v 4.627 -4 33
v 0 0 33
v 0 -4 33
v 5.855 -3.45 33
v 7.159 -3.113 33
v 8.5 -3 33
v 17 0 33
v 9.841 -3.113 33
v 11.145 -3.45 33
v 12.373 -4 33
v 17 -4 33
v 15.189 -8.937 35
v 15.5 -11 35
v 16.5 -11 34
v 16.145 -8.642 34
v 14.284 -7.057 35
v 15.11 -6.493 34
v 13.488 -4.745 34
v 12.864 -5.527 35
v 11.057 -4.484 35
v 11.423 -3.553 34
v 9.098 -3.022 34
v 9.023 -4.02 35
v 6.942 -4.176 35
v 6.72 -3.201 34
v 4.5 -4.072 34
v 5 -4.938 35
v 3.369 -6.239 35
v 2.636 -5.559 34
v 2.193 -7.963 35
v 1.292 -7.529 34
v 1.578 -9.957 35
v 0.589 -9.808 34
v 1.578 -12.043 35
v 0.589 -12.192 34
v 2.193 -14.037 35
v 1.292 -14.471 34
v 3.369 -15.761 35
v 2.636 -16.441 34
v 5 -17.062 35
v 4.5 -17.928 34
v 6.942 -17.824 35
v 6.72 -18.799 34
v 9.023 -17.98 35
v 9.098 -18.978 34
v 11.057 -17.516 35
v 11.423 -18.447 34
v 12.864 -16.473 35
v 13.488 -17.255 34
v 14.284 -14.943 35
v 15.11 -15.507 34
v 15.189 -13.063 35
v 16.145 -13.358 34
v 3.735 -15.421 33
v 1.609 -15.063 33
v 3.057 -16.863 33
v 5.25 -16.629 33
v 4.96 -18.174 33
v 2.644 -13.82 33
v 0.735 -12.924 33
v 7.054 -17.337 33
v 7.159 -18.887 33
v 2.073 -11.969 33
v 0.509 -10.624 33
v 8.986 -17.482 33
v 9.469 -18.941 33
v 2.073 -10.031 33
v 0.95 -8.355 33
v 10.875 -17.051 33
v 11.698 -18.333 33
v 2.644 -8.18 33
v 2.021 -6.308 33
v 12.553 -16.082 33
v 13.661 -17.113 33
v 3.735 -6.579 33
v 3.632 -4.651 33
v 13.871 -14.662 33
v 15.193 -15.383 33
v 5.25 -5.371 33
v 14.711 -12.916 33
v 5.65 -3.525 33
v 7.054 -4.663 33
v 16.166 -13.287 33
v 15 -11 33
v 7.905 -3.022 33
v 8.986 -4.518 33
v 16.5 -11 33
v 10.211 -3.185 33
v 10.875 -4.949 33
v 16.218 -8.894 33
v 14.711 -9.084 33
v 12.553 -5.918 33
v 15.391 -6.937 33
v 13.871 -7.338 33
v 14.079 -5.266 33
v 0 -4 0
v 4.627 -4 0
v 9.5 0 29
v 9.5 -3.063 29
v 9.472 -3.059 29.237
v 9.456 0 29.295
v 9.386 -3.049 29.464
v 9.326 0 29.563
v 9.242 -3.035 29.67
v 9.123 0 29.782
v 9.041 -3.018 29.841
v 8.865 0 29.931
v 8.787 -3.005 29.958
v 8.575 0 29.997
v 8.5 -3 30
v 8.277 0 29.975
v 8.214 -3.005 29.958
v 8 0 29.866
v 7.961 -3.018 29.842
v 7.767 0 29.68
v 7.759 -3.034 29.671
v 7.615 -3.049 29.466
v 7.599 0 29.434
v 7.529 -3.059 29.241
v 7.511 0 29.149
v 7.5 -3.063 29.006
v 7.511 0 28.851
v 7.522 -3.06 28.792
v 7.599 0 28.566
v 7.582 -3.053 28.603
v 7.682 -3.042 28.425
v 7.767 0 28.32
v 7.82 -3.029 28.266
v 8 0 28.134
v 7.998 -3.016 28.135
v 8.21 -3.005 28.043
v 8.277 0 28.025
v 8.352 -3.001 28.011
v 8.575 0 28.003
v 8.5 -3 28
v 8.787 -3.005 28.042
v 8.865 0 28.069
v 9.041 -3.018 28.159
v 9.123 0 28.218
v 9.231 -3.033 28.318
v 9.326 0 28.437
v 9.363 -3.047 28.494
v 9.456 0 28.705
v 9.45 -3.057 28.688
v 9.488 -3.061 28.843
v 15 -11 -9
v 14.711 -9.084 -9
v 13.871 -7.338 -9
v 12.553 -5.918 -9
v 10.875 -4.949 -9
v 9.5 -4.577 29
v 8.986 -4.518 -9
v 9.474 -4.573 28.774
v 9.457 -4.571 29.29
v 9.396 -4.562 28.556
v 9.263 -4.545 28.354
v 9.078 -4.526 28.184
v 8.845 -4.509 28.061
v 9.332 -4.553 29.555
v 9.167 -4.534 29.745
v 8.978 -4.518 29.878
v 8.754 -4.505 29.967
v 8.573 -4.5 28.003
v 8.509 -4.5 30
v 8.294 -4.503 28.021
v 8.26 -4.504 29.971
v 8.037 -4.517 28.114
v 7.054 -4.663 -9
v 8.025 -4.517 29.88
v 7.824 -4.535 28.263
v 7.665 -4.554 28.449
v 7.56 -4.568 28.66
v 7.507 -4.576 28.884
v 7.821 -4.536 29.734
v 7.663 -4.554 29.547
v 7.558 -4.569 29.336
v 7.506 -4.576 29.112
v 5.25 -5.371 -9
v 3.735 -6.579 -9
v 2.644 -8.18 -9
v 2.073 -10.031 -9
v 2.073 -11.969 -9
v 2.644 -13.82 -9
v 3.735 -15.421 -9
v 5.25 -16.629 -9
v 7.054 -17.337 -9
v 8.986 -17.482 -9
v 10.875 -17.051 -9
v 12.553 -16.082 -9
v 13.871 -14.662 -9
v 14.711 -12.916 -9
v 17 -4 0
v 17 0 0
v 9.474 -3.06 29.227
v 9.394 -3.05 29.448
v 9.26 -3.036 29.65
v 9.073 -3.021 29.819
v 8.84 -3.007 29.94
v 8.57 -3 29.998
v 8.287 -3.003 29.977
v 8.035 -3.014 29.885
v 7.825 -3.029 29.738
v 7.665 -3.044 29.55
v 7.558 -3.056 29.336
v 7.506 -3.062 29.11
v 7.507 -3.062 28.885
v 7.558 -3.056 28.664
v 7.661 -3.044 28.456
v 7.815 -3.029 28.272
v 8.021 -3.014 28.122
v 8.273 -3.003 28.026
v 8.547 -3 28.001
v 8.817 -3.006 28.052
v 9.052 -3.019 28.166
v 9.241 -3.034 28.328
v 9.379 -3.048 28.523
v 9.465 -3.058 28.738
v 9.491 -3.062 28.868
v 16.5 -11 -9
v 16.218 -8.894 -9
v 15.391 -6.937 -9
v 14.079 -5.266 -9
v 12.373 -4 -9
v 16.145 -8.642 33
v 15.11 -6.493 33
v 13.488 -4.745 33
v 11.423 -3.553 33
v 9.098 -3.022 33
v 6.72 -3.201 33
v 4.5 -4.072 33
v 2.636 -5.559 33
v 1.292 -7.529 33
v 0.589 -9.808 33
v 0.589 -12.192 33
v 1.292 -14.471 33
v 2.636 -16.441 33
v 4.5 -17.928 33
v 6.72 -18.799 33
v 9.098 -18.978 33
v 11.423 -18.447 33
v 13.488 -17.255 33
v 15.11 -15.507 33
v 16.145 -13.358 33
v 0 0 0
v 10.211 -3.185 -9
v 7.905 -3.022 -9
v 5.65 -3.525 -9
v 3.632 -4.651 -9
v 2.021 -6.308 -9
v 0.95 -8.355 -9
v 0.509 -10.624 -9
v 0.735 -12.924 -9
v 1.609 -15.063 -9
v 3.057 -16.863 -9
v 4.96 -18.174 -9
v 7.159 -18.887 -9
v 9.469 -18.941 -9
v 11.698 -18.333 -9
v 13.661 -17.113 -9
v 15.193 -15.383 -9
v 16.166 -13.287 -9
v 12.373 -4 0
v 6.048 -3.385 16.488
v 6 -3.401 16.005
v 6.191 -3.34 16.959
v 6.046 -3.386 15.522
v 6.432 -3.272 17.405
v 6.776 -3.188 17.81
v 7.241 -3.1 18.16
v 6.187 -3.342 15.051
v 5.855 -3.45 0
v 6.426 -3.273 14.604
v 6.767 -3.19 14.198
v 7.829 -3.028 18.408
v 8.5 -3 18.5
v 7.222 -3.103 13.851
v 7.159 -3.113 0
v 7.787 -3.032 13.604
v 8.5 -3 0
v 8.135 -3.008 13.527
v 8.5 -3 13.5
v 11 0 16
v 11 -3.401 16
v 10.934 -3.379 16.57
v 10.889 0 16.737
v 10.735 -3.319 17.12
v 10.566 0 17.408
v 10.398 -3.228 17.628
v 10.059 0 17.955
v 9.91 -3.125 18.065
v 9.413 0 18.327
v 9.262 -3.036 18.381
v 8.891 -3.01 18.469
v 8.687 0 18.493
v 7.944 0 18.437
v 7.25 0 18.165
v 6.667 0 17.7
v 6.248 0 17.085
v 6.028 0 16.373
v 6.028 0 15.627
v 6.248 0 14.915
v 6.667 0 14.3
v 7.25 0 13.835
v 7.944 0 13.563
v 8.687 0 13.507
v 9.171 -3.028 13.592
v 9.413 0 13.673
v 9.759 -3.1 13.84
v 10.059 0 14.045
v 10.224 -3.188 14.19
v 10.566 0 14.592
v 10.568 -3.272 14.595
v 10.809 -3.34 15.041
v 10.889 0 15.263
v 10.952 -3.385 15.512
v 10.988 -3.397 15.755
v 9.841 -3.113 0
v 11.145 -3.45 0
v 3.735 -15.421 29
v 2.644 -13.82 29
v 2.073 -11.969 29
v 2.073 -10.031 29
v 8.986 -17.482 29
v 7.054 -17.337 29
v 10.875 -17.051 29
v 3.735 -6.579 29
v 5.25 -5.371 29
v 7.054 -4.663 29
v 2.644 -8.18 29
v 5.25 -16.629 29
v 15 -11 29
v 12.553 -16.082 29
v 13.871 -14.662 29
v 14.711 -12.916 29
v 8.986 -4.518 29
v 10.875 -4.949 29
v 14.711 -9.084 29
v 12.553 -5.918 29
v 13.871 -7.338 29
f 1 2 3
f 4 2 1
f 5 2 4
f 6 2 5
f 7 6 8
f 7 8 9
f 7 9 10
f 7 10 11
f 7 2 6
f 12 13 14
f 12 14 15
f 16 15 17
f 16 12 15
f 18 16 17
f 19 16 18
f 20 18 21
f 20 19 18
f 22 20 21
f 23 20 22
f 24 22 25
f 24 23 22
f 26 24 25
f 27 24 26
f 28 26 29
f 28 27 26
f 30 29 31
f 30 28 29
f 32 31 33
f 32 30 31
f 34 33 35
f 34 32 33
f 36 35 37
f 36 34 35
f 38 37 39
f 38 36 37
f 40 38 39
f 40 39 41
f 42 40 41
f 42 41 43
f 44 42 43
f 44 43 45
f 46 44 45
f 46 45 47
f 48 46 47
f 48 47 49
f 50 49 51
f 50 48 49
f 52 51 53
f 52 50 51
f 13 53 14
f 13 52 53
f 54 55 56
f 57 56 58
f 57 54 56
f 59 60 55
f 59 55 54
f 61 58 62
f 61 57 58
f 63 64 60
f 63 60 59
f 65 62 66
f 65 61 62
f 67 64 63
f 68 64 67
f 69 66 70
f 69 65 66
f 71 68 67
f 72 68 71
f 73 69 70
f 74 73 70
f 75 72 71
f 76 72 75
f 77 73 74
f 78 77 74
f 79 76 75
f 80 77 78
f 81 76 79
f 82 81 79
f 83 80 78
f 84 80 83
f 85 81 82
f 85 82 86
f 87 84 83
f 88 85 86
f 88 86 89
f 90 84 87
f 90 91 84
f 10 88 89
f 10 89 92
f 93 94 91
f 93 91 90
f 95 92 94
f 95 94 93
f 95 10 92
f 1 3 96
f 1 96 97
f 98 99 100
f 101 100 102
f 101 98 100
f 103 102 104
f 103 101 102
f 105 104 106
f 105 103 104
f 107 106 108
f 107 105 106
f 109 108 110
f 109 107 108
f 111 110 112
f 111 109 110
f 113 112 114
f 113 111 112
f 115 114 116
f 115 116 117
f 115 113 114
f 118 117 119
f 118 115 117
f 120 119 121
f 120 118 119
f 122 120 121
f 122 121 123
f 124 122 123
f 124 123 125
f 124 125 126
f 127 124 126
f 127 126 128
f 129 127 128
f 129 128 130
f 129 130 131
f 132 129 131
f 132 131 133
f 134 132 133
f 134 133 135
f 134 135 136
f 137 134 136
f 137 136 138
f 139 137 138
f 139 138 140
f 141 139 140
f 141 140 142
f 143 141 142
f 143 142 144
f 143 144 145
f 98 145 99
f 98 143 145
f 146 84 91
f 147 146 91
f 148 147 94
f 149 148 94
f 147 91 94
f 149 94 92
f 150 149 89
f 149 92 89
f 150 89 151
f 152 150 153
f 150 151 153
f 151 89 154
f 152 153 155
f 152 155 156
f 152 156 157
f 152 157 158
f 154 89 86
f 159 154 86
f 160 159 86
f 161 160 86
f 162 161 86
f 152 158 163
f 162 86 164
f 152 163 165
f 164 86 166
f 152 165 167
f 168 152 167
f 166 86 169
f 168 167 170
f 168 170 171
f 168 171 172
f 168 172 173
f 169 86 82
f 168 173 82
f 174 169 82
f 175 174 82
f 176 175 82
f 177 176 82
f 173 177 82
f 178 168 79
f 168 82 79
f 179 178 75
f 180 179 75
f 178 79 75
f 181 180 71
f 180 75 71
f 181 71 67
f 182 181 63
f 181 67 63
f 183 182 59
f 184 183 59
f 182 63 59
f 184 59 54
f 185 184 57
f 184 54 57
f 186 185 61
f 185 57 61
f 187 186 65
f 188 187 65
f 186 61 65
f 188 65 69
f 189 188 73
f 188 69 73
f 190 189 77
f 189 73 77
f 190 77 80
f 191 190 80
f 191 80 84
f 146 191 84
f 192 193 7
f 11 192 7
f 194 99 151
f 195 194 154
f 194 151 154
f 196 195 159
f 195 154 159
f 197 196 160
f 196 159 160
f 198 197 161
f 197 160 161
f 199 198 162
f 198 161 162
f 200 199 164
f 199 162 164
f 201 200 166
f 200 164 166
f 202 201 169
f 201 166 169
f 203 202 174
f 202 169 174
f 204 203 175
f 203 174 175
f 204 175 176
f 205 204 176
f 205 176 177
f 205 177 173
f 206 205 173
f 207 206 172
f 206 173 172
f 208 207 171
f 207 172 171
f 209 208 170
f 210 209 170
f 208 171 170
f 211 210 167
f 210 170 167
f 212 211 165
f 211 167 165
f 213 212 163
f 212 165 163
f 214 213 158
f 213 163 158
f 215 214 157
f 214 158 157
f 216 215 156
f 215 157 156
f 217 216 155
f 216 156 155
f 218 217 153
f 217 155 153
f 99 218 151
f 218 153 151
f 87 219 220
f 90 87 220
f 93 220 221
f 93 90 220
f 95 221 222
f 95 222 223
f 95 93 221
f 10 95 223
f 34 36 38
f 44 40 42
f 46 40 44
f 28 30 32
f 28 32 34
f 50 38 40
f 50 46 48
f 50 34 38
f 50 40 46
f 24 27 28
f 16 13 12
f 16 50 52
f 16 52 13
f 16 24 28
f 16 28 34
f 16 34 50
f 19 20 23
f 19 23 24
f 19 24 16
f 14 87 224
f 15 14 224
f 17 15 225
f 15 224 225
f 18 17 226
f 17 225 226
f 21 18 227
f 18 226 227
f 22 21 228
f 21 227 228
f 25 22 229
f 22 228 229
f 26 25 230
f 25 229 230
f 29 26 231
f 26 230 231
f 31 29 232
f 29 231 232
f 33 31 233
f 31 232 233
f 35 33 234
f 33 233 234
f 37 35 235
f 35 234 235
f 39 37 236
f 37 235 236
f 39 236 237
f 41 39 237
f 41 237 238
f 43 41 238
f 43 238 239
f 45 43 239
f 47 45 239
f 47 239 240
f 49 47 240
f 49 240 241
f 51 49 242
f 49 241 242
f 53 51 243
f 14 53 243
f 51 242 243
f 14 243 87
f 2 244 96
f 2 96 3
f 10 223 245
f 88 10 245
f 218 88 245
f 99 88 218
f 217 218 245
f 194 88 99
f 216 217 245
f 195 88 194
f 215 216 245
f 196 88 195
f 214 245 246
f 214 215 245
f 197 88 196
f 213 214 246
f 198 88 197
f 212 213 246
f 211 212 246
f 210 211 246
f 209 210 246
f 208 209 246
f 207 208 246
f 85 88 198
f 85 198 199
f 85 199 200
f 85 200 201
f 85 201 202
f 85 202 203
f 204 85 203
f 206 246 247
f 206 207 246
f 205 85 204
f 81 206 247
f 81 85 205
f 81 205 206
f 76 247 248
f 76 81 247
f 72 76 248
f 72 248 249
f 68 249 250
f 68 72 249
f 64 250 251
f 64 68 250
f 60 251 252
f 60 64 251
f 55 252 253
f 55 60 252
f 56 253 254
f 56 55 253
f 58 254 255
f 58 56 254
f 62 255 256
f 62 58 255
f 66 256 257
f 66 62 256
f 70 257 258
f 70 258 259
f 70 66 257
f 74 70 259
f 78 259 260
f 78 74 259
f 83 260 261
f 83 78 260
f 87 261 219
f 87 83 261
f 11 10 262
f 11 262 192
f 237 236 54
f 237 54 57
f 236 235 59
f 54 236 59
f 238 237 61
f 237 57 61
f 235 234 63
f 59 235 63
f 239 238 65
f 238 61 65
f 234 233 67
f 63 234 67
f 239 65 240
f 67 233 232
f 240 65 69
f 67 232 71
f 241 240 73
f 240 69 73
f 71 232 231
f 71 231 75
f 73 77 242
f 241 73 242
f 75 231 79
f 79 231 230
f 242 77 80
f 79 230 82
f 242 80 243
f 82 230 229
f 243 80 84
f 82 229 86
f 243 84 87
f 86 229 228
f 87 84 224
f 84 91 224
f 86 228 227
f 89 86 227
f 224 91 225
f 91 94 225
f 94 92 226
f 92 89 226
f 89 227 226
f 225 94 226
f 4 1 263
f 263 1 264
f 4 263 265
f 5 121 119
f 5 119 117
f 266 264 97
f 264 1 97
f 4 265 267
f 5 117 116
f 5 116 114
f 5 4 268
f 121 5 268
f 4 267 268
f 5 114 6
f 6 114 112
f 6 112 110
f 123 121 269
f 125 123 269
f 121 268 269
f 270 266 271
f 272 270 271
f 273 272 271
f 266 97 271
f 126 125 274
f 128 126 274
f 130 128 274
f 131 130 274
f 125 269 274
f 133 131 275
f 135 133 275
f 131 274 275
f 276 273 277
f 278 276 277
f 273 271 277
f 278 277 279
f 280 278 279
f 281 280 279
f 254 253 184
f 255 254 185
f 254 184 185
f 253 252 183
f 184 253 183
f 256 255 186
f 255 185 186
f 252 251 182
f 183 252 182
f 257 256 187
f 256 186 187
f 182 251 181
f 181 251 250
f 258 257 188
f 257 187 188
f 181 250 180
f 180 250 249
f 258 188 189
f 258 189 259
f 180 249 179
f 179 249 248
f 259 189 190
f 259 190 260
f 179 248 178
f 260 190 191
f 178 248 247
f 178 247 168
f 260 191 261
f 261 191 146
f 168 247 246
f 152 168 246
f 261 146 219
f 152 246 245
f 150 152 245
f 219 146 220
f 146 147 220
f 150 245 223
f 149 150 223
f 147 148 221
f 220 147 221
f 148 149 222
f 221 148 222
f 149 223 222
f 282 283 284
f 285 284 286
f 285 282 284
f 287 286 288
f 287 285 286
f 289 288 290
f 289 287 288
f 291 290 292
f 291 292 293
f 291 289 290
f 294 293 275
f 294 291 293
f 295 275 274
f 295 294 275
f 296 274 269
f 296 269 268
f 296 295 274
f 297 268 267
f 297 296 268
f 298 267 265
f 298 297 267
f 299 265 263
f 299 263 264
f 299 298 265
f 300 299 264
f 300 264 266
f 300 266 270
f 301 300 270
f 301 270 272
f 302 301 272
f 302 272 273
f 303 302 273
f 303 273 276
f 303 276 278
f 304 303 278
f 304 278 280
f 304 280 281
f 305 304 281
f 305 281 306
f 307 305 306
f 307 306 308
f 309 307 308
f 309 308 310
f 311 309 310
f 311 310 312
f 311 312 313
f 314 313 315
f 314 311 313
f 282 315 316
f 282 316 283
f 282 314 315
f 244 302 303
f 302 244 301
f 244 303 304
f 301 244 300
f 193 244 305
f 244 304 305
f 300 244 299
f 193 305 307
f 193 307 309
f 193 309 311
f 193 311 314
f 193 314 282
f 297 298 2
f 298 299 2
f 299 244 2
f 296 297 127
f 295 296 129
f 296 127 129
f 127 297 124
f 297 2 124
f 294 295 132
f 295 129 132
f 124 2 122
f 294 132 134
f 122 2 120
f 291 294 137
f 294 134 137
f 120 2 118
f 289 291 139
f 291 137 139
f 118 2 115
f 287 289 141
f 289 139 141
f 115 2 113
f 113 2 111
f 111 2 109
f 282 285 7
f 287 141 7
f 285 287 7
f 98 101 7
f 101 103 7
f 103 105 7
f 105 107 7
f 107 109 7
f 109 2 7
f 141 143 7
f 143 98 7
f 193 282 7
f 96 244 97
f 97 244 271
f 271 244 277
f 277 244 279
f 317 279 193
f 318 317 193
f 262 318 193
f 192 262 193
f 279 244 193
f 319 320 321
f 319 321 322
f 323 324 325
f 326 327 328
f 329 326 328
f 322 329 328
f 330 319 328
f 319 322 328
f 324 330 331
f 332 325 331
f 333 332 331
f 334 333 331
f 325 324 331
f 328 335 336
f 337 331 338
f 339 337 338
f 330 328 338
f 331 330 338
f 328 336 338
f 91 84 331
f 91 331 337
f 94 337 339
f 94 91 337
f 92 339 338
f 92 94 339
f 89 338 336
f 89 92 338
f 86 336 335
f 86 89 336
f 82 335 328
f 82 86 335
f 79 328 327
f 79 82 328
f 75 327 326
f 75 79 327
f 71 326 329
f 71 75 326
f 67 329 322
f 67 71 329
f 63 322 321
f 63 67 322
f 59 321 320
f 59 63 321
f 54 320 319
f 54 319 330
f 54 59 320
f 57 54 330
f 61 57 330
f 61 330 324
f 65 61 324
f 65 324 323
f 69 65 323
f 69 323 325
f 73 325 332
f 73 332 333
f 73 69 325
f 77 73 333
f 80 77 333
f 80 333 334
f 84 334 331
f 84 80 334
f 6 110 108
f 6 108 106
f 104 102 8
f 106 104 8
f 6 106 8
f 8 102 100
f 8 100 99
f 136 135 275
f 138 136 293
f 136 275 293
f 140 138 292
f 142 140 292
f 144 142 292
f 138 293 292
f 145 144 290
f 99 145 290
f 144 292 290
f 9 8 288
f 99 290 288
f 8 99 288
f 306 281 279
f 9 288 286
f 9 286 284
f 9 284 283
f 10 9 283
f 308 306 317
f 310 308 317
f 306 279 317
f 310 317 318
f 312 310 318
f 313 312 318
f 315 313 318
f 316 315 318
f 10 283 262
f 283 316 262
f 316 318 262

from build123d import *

# Parameters (mm, degrees)
F0_W      = 17
F0_H      = 33
F0_R      = 2.5
F0_R_2    = 1
F1_DEPTH  = 4
F3_DEPTH  = 33
F4_R      = 6.5
F5_DEPTH  = 42
F6_R      = 1
F7_DEPTH  = 1
F8_R      = 6.5
F9_DEPTH  = 4
F8_R_2    = 8
F10_DEPTH = 2
F11_SIZE  = 1


with BuildPart() as f1:
    # F0 (on Front) → F1 (new body)
    with BuildSketch(Plane.XZ):
        with Locations((8.5, 16.5)):
            Rectangle(F0_W, F0_H)
        with Locations((8.5, 16)):
            Circle(F0_R, mode=Mode.SUBTRACT)
        with Locations((8.5, 29)):
            Circle(F0_R_2, mode=Mode.SUBTRACT)
    extrude(amount=F1_DEPTH)

    # F2 (on face) → F3 (cut, through all)
    with BuildSketch(Plane(origin=(0, 0, 0), x_dir=(1, 0, 0), z_dir=(0, 0, -1))):
        with BuildLine():
            ThreePointArc((4.6270166538, 4), (6.5, 3.2540333076), (8.5, 3))
            ThreePointArc((8.5, 3), (10.5, 3.2540333076), (12.3729833462, 4))
            Line((12.3729833462, 4), (4.6270166538, 4))
        make_face()
    extrude(amount=-F3_DEPTH, mode=Mode.SUBTRACT)


with BuildPart() as f5:
    # F4 (on face) → F5 (new body)
    with BuildSketch(Plane.XY.offset(33)):
        with BuildLine():
            ThreePointArc((12.3729833462, -4), (8.5, -3), (4.6270166538, -4))
            ThreePointArc((4.6270166538, -4), (4.4369879873, -17.8914391374), (16.5, -11))
            ThreePointArc((16.5, -11), (15.3914391374, -6.9369879873), (12.3729833462, -4))
        make_face()
        with Locations((8.5, -11)):
            Circle(F4_R, mode=Mode.SUBTRACT)
    extrude(amount=-F5_DEPTH)

    # F6 (on face) → F7 (cut, symmetric)
    with BuildSketch(Plane.XZ.offset(4)):
        with Locations((8.5, 29)):
            Circle(F6_R)
    extrude(amount=F7_DEPTH, both=True, mode=Mode.SUBTRACT)


with BuildPart() as f9:
    # F8 (on face) → F9 (new body)
    with BuildSketch(Plane.XY.offset(33)):
        with Locations((8.5, -11)):
            Circle(F8_R)
    extrude(amount=-F9_DEPTH)

    # F8 (on face) → F10 (join)
    with BuildSketch(Plane.XY.offset(33)):
        with Locations((8.5, -11)):
            Circle(F8_R_2)
        with Locations((8.5, -11)):
            Circle(F8_R, mode=Mode.SUBTRACT)
        with Locations((8.5, -11)):
            Circle(F8_R)
    extrude(amount=F10_DEPTH)

    # F11
    f11_edges = [f9.edges().sort_by_distance(p)[0] for p in [
        (0.5, -11, 35),
    ]]
    chamfer(f11_edges, length=F11_SIZE)


solid = Compound([f1.part, f5.part, f9.part])
